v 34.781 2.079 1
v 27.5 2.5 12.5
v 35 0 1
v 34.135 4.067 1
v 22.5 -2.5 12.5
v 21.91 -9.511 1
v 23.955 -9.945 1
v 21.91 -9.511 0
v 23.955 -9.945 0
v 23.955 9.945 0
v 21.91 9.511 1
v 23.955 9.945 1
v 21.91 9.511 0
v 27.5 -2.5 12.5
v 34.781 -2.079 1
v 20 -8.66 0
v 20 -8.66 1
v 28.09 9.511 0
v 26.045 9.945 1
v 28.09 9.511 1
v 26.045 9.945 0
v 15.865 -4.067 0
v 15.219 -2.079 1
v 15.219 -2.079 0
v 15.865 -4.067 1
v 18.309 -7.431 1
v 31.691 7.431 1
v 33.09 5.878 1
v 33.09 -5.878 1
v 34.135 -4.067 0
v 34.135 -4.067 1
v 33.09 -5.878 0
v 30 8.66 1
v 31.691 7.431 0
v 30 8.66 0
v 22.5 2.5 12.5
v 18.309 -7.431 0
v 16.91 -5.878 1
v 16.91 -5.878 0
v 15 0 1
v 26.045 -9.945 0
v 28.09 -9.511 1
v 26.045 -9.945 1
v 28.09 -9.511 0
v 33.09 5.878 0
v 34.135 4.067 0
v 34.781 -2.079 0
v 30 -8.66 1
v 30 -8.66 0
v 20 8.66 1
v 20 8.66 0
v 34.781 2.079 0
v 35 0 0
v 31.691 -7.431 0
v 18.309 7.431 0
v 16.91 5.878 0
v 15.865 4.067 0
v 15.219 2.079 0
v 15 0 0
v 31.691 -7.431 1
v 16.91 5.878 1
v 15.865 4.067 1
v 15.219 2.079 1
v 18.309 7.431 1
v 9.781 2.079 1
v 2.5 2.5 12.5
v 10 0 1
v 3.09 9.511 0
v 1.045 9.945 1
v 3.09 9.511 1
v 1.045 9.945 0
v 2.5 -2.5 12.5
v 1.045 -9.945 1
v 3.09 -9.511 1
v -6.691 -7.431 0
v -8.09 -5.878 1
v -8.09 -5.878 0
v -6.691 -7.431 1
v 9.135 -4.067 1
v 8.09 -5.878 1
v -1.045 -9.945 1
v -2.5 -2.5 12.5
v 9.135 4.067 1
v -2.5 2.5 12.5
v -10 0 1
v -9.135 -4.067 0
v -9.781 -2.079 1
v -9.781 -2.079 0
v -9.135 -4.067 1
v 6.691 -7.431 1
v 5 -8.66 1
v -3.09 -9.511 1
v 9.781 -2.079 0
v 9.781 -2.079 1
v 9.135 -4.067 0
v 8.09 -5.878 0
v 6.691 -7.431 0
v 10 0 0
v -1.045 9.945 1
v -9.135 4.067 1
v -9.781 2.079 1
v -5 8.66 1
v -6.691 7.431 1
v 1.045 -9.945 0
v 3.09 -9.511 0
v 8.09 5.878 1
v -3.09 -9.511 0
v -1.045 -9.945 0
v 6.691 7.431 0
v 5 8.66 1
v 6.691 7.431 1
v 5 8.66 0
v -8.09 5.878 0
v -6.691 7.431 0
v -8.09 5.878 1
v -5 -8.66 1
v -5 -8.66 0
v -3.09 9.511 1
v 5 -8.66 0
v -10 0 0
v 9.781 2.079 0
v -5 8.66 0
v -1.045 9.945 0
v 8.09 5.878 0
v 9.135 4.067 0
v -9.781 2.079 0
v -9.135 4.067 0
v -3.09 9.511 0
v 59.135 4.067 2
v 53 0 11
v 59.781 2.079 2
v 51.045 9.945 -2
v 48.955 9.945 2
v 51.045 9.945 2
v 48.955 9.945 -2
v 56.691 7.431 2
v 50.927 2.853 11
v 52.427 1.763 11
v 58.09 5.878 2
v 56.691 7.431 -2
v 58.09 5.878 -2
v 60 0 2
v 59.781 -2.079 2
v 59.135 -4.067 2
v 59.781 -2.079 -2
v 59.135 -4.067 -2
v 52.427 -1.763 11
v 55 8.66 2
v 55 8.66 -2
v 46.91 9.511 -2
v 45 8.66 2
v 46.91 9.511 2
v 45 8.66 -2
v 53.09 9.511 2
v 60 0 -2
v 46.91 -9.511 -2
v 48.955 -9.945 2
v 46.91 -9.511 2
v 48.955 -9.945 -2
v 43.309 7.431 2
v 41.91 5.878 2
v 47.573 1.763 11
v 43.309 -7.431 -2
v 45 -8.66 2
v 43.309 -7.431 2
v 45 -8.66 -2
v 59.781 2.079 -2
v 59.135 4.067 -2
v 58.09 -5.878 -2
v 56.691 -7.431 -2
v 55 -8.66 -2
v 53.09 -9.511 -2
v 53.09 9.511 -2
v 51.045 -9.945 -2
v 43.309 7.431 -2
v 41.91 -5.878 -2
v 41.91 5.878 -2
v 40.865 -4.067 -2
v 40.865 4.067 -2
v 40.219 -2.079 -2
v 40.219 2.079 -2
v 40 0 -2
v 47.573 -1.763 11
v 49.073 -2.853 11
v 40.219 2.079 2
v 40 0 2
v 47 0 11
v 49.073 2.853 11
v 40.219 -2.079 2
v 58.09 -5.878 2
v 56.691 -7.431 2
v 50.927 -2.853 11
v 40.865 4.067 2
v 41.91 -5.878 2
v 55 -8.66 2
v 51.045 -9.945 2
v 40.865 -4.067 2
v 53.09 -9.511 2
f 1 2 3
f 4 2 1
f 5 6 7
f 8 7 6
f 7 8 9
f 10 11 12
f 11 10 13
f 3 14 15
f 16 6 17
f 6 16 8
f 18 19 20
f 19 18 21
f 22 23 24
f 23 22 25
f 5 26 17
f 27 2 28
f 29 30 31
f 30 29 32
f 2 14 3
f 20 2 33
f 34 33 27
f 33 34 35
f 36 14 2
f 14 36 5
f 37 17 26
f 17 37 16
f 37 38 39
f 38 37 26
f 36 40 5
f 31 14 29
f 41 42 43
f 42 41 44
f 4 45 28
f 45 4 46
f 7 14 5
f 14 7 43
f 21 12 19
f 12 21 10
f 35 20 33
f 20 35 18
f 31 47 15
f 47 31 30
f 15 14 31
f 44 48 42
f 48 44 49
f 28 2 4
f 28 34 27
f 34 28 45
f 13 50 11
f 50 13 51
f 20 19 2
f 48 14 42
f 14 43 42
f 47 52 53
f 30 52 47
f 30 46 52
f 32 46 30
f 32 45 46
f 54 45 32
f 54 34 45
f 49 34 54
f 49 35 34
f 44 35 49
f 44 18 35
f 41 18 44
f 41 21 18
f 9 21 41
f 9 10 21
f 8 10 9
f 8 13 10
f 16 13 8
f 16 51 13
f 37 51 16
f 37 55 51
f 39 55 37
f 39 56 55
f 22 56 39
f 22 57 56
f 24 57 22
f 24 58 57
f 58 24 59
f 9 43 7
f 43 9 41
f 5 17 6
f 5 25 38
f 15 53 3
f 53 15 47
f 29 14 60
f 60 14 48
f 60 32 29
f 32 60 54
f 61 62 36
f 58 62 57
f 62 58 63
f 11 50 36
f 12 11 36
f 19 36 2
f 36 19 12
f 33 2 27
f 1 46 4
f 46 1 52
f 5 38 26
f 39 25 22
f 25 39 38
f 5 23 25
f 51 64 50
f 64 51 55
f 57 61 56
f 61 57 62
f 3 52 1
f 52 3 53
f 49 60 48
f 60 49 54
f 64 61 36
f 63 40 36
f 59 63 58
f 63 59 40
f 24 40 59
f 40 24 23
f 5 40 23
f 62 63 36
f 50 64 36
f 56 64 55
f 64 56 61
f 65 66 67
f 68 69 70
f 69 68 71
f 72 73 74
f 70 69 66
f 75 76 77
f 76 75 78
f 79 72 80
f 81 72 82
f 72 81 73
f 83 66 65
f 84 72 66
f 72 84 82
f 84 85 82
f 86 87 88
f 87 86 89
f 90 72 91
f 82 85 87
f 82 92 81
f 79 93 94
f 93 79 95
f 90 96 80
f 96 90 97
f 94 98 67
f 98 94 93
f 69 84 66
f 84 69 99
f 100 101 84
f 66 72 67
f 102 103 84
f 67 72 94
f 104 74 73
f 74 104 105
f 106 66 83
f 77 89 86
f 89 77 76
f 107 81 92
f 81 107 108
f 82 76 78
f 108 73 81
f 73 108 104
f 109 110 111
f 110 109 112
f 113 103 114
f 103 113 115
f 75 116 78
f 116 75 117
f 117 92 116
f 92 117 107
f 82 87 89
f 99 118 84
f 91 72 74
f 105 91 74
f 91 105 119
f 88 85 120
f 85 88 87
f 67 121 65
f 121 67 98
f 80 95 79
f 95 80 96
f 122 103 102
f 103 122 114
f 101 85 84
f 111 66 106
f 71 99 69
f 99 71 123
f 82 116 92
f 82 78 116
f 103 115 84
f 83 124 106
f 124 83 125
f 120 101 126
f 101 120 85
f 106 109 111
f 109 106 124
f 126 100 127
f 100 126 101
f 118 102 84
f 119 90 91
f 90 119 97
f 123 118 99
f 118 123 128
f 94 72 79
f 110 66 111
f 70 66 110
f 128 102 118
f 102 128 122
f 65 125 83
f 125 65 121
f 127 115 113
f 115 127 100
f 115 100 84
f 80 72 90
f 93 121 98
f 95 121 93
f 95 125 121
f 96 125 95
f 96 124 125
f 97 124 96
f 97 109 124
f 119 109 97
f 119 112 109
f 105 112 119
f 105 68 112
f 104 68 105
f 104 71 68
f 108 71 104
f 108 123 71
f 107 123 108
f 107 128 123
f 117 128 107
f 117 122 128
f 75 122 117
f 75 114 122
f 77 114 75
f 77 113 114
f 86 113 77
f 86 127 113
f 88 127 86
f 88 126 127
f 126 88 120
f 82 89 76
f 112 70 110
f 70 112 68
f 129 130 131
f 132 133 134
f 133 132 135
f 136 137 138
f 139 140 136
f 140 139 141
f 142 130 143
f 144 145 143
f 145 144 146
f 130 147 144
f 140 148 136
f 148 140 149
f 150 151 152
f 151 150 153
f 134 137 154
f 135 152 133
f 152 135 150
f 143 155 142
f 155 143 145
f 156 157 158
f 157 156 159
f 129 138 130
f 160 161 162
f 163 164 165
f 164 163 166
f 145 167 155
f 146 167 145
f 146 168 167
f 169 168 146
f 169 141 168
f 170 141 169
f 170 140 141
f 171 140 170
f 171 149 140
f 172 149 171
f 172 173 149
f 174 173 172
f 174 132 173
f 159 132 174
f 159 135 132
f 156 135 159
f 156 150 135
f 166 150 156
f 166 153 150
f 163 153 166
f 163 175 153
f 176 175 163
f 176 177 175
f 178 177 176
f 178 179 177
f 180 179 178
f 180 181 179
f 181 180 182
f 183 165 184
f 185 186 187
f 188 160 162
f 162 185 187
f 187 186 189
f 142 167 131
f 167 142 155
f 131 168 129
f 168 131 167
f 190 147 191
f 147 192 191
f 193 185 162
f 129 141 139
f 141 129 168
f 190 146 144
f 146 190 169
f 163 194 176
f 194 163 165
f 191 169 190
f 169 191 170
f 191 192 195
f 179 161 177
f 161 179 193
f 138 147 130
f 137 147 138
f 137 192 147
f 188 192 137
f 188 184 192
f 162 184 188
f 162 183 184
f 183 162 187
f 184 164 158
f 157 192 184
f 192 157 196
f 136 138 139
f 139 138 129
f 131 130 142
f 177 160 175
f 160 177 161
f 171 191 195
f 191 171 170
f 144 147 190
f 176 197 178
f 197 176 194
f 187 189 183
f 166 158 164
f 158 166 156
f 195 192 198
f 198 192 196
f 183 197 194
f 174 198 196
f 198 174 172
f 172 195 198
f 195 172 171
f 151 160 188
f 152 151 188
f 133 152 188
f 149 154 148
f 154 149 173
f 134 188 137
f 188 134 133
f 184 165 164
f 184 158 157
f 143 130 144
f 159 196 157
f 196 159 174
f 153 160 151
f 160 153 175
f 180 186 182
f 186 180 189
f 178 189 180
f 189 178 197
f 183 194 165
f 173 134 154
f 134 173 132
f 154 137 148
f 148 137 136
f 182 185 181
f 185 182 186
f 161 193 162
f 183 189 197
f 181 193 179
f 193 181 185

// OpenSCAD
// Empty
hull();
// No children
hull() { }

// Hull of hull (forces internal cache to be initialized; this has caused a crash earlier)
translate([25,0,0]) hull() hull3test();

module hull3test() {
  hull() {
    cylinder(r=10, h=1);
    translate([0,0,10]) cube([5,5,5], center=true);
  }
}
hull3test();

translate([50,0,0]) hull() {
  translate([0,0,10]) cylinder(r=3);
  difference() {
    cylinder(r=10, h=4, center=true);
    cylinder(r=5, h=5, center=true);
  }
}

// Don't Crash (issue 188)

translate([-5,-5,-5]) {
  hull() {
    intersection() {
      cube([1,1,1]);
      translate([-1,-1,-1]) cube([1,1,1]);
    }
  }
}

module hull3null() {
  hull() {
    cube(0);
    sphere(0);
  }
}
hull3null();
